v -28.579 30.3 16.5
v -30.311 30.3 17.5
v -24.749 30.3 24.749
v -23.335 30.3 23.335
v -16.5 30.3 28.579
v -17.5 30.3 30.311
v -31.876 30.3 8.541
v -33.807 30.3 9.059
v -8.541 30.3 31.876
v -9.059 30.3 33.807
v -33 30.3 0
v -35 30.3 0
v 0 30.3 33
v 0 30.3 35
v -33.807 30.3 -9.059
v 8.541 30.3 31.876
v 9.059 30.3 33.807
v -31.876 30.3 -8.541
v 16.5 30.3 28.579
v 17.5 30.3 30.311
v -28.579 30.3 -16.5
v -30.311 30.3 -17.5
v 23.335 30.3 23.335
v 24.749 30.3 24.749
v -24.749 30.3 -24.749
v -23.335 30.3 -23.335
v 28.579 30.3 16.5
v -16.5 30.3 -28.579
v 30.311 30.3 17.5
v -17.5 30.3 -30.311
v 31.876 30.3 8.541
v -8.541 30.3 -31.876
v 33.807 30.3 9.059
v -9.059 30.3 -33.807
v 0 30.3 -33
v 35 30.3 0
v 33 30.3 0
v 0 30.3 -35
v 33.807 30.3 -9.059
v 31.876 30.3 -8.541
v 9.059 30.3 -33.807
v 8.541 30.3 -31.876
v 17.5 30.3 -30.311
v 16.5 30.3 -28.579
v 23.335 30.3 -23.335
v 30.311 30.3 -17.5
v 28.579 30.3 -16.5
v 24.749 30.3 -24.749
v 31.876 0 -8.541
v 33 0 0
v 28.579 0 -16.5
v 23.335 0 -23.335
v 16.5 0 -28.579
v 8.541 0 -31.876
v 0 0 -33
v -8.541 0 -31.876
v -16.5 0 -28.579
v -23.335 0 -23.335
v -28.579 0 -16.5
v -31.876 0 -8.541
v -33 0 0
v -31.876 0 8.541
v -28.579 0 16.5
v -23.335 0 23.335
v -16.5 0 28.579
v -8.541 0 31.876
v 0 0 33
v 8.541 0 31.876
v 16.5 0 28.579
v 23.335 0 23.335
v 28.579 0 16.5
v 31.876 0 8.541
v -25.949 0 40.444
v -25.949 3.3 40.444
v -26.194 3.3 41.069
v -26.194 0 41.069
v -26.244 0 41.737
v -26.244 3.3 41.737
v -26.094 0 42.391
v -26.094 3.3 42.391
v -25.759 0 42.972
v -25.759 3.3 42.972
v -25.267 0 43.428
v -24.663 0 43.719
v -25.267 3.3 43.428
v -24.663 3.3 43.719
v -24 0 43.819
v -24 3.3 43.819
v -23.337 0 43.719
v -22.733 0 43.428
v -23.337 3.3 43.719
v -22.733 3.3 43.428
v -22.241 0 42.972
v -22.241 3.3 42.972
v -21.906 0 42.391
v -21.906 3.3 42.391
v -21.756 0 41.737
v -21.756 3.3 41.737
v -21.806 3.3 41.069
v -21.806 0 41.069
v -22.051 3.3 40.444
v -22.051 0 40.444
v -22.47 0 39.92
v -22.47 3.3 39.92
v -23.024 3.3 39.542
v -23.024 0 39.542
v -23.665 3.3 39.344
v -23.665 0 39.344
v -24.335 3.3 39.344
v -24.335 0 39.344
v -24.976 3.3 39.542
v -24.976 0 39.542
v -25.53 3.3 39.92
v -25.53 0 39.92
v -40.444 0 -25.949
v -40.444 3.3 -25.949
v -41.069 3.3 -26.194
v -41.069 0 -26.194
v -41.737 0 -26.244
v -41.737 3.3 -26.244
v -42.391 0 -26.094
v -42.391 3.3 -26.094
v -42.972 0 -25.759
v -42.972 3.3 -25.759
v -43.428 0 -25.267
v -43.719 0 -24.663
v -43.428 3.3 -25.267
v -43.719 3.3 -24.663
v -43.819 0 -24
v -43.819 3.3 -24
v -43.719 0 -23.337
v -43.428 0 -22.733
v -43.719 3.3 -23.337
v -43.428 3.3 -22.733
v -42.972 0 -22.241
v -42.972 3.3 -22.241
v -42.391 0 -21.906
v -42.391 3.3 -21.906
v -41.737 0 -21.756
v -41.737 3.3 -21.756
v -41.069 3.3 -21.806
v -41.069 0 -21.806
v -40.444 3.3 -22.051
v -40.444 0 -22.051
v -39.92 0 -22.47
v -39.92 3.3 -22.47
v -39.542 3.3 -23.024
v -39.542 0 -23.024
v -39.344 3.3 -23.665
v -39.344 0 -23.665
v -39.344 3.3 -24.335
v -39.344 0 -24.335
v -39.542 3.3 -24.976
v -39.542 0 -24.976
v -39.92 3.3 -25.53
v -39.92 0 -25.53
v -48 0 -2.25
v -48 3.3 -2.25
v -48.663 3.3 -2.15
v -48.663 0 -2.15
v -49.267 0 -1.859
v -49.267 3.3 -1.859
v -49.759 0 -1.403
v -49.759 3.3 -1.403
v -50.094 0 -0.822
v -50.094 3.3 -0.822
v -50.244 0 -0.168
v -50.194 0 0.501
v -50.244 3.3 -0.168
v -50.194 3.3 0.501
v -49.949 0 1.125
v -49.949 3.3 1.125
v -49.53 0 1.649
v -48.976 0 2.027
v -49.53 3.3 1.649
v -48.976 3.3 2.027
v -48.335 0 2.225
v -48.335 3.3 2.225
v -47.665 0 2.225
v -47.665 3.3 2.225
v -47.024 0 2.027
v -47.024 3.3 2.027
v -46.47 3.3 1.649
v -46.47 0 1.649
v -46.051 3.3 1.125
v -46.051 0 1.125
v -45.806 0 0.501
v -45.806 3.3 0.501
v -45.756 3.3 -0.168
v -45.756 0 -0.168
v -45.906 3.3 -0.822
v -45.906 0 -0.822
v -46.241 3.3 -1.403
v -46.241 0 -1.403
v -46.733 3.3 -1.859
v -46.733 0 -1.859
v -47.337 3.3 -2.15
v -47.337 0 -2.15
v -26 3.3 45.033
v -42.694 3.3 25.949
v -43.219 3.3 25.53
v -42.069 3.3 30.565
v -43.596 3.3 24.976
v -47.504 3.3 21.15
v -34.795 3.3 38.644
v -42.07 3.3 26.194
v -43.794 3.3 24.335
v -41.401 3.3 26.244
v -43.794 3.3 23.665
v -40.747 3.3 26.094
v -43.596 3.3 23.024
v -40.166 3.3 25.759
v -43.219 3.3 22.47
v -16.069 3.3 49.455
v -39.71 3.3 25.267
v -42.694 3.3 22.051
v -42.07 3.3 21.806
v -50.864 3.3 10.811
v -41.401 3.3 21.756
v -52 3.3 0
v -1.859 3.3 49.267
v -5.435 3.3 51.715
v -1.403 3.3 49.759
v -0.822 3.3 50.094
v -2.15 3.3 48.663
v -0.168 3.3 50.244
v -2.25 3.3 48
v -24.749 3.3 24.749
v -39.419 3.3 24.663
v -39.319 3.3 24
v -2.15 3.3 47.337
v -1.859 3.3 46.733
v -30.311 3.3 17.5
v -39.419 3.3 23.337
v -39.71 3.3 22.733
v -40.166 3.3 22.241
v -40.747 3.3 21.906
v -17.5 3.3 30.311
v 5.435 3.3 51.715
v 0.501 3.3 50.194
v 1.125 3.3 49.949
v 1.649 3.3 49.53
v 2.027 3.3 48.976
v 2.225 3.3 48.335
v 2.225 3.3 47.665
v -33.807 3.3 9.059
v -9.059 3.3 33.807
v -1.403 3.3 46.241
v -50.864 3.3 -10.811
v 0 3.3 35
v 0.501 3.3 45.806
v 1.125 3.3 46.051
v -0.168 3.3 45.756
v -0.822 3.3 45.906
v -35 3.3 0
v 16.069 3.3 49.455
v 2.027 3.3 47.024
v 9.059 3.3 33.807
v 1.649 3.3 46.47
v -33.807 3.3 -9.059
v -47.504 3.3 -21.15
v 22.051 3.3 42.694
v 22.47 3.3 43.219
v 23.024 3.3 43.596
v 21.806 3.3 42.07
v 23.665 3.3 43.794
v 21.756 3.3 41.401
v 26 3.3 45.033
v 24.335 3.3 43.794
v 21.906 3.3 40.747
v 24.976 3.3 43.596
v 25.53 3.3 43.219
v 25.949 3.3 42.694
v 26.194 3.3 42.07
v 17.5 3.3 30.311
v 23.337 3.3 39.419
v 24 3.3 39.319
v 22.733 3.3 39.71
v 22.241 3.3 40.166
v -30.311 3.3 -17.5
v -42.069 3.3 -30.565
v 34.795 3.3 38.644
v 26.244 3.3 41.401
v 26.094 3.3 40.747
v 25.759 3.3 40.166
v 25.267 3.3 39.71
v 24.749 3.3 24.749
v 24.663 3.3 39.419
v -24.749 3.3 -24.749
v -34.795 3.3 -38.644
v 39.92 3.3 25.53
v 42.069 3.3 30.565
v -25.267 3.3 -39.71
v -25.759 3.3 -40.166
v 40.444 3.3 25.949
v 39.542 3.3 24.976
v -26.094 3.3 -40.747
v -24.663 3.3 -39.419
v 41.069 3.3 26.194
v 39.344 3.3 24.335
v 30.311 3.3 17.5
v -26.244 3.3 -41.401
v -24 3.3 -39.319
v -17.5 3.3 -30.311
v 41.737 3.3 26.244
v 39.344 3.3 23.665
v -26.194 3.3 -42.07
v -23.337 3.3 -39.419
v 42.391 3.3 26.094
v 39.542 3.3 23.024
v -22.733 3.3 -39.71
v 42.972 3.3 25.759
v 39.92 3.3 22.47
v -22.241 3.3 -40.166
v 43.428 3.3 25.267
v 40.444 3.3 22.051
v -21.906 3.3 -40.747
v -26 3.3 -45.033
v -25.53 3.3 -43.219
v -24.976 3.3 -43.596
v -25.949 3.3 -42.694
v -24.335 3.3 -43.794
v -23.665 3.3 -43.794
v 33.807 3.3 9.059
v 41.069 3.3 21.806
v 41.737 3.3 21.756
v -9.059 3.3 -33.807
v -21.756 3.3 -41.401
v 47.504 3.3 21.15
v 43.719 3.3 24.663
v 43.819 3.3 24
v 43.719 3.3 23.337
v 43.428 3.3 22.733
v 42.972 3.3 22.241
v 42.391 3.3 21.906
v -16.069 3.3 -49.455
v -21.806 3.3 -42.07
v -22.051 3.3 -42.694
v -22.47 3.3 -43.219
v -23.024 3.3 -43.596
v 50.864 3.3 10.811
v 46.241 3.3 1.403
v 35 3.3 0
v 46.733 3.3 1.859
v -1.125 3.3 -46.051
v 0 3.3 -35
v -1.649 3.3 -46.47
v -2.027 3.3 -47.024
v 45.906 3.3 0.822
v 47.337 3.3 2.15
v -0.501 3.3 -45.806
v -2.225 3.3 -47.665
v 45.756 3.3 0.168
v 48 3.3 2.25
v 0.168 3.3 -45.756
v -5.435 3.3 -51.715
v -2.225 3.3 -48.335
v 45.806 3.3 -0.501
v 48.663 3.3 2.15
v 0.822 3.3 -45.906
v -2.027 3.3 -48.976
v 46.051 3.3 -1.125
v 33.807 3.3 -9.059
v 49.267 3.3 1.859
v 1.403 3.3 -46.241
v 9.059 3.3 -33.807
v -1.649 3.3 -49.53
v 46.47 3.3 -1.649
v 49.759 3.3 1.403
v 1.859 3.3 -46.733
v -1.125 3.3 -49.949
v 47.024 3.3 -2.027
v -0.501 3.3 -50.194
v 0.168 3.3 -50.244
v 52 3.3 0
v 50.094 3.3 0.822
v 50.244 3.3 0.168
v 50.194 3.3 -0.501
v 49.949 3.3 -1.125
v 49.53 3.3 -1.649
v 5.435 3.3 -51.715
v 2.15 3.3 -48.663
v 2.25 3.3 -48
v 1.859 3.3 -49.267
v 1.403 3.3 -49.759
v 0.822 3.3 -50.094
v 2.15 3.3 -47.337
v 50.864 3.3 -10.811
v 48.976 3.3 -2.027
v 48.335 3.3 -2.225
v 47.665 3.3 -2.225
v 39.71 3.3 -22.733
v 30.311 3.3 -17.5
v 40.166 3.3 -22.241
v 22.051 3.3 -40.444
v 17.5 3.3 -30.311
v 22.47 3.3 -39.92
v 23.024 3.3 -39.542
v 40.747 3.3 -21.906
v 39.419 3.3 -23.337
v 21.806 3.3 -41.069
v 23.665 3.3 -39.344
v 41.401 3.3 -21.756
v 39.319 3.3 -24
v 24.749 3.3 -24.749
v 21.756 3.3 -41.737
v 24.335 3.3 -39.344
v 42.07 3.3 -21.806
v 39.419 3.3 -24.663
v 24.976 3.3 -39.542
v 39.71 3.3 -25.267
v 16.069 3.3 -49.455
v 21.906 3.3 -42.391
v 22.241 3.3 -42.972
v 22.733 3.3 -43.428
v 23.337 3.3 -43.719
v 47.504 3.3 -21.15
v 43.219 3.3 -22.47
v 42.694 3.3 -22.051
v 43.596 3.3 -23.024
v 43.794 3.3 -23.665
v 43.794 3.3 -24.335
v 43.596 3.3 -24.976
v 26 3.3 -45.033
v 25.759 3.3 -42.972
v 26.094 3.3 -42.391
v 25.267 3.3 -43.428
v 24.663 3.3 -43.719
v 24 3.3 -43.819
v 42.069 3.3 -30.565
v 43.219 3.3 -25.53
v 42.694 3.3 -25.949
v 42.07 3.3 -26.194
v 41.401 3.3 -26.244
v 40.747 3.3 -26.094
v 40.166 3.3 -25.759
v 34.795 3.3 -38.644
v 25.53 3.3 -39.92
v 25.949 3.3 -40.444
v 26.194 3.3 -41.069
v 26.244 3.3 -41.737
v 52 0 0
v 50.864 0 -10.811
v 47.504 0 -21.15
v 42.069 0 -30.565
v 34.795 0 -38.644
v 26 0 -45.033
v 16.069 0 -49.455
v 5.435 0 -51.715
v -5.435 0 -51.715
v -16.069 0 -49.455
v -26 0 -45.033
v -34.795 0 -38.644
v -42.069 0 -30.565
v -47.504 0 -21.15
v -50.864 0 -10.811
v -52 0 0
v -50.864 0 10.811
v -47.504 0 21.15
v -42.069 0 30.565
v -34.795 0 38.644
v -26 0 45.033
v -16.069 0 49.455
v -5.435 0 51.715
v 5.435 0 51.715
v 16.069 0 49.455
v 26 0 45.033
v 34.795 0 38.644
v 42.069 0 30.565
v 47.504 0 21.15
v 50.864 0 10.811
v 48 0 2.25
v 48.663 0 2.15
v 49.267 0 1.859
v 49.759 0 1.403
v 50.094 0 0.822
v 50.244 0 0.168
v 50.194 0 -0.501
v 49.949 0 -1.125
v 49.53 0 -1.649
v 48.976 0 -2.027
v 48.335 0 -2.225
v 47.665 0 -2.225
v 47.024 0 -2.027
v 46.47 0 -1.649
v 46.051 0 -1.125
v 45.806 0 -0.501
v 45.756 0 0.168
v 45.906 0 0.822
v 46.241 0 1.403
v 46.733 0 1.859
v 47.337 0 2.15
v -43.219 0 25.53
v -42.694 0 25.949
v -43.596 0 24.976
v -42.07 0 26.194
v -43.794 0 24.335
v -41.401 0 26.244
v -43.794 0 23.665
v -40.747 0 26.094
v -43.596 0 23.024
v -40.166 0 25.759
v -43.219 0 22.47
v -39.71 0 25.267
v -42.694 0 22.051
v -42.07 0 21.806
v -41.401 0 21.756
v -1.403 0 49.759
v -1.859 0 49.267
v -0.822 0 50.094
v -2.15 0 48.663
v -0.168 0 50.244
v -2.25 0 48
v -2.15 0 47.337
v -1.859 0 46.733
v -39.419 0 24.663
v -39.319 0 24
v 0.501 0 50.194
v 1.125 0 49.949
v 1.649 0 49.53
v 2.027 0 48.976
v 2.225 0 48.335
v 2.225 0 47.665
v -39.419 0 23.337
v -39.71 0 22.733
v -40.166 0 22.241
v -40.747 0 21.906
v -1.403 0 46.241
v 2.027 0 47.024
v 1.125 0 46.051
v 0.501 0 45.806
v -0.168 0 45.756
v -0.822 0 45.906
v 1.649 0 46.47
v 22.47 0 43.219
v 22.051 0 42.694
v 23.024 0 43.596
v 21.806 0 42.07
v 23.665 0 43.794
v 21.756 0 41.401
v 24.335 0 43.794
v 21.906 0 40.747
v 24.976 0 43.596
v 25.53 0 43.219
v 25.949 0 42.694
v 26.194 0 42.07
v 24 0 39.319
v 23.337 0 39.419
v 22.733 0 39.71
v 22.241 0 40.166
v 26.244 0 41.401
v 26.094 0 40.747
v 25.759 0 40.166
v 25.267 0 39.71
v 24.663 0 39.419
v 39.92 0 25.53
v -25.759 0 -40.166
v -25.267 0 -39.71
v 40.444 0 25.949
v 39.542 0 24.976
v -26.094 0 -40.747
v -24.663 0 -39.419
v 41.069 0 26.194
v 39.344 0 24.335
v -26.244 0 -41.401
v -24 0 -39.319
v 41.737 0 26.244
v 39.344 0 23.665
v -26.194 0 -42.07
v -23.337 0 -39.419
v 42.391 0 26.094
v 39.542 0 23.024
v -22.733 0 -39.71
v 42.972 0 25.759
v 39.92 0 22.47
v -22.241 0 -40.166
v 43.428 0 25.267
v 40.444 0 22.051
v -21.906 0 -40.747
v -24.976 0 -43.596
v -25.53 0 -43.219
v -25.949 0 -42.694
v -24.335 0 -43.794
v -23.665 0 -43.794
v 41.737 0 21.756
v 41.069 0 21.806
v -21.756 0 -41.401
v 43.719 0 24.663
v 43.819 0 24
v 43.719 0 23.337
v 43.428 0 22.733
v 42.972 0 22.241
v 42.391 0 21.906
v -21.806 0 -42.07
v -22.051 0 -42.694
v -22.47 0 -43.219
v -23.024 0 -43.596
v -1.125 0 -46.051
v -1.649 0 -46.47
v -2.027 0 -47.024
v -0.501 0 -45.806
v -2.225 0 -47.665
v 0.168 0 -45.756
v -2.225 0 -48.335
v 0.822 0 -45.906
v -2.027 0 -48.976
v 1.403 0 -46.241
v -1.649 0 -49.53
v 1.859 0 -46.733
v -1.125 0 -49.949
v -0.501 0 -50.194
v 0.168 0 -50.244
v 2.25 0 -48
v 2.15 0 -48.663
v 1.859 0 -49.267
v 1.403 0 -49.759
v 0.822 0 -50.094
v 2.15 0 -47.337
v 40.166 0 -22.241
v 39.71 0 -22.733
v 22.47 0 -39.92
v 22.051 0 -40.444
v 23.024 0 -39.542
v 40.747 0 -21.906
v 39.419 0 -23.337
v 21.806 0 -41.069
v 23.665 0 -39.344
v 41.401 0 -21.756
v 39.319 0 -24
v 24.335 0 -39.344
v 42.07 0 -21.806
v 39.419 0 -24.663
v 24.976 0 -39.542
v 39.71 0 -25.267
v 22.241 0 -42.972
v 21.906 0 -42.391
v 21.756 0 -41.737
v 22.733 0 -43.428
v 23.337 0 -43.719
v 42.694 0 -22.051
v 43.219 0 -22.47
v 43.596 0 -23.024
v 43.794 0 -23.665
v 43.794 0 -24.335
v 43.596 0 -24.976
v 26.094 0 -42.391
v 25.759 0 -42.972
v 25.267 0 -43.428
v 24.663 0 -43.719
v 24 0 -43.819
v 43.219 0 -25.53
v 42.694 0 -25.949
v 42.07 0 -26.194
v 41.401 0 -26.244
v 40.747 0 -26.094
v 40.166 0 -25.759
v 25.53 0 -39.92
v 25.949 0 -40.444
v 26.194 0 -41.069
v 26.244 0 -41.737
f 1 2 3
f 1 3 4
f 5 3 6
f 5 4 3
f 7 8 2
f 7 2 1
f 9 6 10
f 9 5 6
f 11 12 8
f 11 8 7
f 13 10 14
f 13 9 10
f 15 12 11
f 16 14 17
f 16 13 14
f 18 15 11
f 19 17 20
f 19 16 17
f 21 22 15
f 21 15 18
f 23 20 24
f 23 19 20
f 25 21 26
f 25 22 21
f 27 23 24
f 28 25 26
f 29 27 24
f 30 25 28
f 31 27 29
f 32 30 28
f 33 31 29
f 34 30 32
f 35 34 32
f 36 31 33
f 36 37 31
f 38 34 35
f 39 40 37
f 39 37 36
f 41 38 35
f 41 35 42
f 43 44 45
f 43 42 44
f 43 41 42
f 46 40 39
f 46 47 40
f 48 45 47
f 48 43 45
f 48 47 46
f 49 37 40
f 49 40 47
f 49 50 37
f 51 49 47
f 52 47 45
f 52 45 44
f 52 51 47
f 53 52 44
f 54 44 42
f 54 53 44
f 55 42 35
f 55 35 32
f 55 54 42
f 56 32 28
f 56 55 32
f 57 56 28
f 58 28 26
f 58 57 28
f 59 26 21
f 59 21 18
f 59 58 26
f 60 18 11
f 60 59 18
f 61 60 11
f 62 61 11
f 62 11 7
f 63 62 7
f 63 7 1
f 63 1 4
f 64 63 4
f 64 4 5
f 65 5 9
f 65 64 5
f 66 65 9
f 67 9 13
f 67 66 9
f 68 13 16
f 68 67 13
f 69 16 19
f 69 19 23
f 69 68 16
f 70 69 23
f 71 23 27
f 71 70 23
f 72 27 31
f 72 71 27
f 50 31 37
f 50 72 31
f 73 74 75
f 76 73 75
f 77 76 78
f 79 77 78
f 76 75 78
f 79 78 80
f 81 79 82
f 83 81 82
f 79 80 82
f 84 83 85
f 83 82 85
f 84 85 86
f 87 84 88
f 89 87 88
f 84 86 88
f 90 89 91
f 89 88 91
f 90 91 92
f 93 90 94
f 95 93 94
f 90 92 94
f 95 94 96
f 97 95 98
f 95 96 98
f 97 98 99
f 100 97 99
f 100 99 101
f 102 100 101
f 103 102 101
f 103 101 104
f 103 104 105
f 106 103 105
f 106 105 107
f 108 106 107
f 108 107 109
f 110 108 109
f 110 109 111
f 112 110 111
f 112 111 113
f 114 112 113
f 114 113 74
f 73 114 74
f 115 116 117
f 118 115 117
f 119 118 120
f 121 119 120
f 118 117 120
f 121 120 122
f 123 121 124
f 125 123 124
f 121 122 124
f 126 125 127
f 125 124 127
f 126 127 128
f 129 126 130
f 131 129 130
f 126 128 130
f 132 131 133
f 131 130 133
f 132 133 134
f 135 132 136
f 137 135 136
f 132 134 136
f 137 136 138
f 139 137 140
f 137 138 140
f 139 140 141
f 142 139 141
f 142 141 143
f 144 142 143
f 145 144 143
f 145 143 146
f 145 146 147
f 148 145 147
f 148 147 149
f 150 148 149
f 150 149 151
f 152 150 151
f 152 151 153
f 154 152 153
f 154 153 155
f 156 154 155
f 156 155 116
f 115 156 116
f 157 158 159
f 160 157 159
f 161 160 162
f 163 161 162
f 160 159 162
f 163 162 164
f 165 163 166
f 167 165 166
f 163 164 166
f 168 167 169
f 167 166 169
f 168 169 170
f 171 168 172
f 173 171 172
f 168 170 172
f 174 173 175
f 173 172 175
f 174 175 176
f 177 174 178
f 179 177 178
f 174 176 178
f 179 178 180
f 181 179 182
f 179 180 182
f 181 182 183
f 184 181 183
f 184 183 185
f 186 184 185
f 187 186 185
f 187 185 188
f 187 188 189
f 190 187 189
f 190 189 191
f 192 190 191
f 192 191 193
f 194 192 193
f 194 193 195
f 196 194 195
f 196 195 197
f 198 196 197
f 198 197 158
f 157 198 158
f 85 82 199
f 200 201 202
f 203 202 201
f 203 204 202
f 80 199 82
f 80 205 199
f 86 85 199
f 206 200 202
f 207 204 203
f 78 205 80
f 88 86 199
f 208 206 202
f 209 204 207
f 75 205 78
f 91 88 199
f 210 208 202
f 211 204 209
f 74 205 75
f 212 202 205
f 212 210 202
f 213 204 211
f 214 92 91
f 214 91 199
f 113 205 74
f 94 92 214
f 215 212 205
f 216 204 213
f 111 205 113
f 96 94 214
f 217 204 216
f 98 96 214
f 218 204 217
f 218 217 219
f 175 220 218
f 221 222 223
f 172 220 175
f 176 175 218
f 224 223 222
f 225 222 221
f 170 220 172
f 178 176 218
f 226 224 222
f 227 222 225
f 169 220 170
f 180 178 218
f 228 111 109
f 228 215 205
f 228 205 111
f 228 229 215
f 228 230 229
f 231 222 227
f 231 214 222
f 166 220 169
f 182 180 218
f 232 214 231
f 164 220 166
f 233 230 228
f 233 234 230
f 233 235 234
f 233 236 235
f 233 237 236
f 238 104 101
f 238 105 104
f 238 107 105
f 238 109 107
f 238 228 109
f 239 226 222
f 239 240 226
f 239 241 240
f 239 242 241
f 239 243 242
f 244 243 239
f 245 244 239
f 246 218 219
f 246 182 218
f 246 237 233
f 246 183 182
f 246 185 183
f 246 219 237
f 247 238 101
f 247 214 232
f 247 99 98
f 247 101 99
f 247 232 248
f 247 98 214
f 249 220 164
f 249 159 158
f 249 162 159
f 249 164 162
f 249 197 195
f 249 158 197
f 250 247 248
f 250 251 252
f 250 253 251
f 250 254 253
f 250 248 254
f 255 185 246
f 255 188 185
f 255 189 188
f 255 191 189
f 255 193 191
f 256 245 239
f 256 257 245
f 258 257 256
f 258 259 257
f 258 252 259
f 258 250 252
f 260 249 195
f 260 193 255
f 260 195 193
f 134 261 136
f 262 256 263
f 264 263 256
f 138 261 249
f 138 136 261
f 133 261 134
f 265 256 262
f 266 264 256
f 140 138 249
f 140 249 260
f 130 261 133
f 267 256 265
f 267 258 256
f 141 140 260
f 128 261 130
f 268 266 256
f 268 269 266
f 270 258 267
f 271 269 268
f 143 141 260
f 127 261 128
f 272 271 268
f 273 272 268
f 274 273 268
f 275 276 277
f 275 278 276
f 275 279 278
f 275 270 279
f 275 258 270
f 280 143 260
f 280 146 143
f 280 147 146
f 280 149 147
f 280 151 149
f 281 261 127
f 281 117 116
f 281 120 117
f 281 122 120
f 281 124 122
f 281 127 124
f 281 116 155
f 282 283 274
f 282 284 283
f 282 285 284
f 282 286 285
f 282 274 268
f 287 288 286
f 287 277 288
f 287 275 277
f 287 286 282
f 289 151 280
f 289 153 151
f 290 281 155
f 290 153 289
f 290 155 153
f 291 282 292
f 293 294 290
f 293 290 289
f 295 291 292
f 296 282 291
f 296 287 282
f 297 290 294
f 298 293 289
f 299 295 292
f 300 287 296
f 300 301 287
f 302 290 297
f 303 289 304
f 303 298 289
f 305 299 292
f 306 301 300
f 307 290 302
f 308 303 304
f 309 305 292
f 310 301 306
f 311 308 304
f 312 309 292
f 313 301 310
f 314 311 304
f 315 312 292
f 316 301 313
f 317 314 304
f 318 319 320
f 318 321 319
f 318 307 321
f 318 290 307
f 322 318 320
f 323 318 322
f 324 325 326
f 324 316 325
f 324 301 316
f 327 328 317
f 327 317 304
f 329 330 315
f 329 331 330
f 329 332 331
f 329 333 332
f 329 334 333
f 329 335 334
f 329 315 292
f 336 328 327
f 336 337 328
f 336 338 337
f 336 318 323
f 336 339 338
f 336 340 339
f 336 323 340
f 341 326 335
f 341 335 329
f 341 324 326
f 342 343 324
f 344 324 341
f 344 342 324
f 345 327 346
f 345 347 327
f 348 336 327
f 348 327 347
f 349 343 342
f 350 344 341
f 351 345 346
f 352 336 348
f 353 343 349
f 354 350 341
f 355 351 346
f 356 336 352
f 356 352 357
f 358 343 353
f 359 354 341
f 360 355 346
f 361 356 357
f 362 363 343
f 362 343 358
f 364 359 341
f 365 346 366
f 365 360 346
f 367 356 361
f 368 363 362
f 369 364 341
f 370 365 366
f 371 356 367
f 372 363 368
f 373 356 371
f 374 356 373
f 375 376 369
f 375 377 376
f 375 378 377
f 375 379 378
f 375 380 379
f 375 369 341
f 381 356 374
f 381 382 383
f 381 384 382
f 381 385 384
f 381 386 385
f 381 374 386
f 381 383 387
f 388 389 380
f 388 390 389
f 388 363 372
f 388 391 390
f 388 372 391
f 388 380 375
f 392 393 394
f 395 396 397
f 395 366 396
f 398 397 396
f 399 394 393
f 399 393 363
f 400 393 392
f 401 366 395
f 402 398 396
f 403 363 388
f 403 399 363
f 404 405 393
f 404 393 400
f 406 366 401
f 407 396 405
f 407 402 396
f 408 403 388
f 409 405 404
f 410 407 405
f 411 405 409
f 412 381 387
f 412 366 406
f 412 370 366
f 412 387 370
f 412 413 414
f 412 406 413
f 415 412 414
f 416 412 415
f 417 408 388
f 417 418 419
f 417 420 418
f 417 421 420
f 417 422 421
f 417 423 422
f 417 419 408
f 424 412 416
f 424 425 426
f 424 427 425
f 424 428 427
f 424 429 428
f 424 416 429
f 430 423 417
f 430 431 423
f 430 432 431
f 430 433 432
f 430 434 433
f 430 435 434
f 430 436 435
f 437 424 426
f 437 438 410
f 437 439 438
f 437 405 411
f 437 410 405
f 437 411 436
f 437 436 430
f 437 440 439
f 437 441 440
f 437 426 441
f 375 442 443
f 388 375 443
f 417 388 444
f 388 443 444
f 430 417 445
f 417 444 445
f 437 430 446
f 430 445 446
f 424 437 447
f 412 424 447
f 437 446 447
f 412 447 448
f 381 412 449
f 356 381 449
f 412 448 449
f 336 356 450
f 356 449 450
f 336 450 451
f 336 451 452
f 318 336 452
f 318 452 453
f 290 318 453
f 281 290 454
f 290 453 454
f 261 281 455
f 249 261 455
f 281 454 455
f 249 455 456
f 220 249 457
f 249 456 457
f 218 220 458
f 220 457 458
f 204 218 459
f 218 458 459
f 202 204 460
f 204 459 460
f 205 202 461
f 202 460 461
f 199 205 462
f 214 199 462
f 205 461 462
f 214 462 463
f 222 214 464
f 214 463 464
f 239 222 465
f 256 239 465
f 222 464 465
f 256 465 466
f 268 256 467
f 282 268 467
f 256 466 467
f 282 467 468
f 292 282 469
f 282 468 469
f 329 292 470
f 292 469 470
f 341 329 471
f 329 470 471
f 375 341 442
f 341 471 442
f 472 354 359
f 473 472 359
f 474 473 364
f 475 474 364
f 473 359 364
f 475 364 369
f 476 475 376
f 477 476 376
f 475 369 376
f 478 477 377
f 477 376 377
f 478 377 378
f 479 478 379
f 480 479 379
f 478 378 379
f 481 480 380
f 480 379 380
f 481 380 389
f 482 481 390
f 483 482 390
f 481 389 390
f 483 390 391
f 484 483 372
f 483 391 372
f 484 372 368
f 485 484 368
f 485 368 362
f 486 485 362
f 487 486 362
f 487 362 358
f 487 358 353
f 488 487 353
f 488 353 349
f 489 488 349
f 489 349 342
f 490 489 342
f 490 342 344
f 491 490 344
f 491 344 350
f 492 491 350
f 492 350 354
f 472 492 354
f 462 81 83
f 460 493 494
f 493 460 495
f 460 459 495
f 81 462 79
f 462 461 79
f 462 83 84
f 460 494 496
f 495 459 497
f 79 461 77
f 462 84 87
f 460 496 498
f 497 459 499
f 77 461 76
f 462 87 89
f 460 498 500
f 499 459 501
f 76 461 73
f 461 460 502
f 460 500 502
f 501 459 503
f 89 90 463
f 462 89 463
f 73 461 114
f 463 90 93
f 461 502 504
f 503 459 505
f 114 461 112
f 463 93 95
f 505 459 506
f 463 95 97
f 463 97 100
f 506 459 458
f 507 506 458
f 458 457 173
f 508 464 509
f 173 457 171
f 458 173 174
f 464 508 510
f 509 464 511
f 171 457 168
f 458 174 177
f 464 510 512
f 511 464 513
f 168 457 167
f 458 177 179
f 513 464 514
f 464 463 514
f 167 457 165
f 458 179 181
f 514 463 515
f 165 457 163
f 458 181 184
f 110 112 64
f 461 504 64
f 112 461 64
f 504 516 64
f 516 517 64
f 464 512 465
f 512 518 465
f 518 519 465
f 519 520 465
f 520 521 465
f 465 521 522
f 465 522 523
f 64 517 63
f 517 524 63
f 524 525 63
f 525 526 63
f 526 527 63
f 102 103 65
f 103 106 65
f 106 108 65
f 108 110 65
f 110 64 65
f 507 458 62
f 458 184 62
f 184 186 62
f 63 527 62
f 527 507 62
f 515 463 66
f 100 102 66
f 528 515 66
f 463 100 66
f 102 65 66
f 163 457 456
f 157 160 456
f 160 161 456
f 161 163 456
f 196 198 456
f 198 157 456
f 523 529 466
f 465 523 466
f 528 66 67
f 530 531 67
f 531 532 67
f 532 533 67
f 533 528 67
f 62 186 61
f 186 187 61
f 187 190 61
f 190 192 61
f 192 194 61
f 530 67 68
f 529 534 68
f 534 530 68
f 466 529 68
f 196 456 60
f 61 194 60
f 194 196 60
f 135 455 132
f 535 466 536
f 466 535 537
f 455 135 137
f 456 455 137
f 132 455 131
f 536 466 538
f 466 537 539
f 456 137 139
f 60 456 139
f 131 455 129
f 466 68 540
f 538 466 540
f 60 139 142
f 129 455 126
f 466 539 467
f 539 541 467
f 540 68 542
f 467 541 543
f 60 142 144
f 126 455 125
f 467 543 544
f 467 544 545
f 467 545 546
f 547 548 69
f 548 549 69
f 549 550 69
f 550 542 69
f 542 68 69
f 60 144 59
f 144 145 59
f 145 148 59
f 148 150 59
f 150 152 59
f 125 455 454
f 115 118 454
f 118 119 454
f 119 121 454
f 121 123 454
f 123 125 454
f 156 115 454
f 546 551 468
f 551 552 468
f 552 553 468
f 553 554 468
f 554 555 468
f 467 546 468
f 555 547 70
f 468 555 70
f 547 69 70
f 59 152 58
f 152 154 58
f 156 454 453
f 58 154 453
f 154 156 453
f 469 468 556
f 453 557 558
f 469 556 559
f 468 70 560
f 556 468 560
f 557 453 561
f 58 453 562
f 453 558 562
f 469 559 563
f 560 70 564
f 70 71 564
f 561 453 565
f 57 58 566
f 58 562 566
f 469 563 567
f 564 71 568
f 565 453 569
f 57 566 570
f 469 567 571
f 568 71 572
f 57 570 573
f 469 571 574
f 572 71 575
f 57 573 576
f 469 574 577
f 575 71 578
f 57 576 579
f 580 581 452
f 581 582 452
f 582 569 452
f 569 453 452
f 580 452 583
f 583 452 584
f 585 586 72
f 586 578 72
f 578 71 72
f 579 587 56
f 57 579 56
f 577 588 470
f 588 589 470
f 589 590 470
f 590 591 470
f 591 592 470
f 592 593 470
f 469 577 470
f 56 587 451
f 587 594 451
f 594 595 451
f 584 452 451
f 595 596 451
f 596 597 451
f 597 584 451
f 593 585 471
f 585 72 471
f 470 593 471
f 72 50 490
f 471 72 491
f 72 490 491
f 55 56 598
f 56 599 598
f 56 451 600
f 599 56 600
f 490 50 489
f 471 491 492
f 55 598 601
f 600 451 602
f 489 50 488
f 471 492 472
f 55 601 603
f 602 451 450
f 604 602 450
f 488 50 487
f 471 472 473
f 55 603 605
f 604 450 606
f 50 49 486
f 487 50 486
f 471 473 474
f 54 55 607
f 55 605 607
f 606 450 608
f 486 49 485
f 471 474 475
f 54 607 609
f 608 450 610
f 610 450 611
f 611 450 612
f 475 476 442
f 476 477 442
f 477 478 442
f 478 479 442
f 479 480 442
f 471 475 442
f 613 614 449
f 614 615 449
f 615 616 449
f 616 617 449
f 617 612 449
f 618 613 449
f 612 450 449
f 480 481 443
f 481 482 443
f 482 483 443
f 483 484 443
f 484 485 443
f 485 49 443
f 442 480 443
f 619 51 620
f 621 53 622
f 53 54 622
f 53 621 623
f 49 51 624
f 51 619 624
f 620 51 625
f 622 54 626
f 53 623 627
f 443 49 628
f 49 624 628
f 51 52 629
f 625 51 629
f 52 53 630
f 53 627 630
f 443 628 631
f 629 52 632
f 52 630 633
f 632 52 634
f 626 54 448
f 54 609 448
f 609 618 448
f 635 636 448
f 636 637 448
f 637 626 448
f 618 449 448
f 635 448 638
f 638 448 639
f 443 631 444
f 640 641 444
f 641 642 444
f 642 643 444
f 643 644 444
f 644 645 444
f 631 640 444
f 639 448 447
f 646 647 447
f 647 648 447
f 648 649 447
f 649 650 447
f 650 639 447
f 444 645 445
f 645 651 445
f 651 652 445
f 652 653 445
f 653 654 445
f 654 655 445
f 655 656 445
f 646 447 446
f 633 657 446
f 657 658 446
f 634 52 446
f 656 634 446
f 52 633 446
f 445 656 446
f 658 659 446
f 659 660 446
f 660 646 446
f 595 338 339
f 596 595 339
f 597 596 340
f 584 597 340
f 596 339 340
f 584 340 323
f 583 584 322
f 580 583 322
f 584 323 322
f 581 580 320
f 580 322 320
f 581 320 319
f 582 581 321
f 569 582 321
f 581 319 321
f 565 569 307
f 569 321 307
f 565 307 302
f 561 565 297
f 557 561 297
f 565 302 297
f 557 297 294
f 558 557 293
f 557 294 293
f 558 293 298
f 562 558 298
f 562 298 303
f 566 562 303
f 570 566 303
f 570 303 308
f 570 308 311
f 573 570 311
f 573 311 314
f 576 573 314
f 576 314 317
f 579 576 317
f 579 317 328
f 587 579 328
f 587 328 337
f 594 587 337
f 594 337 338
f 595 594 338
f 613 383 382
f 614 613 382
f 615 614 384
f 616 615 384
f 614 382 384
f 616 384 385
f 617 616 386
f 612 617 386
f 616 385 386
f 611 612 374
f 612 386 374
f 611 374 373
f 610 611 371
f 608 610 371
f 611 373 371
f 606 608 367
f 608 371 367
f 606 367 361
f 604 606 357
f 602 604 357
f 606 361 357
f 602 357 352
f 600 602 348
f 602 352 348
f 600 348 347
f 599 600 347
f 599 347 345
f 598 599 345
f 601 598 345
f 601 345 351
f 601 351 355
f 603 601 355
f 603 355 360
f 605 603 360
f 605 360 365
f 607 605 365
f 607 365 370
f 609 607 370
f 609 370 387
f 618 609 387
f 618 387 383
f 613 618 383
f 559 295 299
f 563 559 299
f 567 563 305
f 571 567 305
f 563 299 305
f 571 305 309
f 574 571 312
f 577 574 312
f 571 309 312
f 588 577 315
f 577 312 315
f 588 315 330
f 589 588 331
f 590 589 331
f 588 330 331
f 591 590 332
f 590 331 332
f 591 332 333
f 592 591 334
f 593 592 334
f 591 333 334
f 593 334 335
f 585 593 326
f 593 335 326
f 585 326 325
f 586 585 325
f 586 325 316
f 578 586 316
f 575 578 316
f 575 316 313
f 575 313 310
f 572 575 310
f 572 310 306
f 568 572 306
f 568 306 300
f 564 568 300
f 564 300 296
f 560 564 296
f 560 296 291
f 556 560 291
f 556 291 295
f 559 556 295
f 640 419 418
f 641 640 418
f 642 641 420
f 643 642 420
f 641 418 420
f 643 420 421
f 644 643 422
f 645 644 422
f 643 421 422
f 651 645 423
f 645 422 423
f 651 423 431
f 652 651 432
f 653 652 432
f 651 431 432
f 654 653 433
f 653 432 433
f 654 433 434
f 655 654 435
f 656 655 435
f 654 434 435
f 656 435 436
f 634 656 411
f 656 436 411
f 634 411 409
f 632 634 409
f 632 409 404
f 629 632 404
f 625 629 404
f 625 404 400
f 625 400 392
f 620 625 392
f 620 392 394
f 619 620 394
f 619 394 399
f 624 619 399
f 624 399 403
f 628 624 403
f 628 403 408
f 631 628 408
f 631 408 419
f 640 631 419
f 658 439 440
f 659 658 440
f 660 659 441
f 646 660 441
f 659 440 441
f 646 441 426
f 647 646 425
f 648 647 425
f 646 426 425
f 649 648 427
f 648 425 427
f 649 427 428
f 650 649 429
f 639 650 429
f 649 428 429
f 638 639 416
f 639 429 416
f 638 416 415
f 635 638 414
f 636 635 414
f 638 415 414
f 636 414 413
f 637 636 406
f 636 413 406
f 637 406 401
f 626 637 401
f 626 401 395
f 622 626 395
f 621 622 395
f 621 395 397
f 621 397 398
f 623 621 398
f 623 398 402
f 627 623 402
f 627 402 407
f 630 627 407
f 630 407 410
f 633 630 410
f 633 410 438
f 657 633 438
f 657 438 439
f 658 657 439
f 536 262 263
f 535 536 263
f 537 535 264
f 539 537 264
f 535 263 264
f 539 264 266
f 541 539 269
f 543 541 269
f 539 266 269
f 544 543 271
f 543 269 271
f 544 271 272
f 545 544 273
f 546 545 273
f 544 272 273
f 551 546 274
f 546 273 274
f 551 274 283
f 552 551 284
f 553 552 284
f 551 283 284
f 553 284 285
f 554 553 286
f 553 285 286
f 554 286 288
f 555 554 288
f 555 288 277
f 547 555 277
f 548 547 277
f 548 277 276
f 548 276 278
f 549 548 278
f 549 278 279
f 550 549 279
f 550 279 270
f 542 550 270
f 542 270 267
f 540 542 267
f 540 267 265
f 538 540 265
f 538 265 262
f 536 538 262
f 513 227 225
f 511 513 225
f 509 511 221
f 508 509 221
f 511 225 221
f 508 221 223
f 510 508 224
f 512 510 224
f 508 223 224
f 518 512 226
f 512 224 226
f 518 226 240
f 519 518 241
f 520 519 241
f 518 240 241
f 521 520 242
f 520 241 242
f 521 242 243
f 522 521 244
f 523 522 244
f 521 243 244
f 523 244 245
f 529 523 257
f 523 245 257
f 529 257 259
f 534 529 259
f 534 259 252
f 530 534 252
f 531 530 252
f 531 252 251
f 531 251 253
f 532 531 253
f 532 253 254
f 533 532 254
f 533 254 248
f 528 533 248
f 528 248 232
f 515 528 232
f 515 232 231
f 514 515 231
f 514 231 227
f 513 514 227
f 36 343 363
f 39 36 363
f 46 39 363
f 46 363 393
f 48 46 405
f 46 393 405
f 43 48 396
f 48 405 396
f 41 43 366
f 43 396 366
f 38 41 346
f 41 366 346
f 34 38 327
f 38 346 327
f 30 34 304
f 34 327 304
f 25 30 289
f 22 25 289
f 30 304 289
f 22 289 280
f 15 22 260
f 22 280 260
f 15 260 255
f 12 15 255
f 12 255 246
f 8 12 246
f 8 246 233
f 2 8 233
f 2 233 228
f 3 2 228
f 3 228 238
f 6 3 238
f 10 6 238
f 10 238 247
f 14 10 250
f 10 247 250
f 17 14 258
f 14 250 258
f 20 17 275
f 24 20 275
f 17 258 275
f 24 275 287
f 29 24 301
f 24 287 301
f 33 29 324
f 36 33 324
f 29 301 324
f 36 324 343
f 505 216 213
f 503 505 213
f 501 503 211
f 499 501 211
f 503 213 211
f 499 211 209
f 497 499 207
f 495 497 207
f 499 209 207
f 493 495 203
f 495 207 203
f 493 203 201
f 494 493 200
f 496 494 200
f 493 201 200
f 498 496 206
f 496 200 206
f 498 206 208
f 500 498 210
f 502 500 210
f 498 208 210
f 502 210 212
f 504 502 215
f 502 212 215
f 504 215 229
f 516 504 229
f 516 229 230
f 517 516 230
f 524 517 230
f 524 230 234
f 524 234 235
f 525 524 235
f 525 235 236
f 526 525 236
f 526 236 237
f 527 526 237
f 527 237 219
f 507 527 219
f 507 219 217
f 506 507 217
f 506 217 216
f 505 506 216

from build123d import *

# Parameters (mm, degrees)
SKETCH1_R           = 52
SKETCH1_R_2         = 33
BOSS_EXTRUDE1_DEPTH = 3.3
SKETCH2_R           = 35
SKETCH2_R_2         = 33
BOSS_EXTRUDE2_DEPTH = 27
SKETCH3_R           = 2.25
CUT_EXTRUDE1_DEPTH  = 4.3
CIRPATTERN1_COUNT   = 12


with BuildPart() as part:
    # Sketch1 → Boss-Extrude1 (new body)
    with BuildSketch(Plane(origin=(0, 0, 0), x_dir=(1, 0, 0), z_dir=(0, 1, 0))):
        Circle(SKETCH1_R)
        Circle(SKETCH1_R_2, mode=Mode.SUBTRACT)
    extrude(amount=BOSS_EXTRUDE1_DEPTH)

    # Sketch2 → Boss-Extrude2 (add)
    with BuildSketch(Plane(origin=(0, 3.3, 0), x_dir=(1, 0, 0), z_dir=(0, 1, 0))):
        Circle(SKETCH2_R)
        Circle(SKETCH2_R_2, mode=Mode.SUBTRACT)
    extrude(amount=BOSS_EXTRUDE2_DEPTH)

    # Sketch3 → Cut-Extrude1 (cut, through all)
    with BuildSketch(Plane(origin=(0, 3.3, 0), x_dir=(1, 0, 0), z_dir=(0, 1, 0))):
        with Locations((0, 48)):
            Circle(SKETCH3_R)
    cut_extrude1 = extrude(amount=-CUT_EXTRUDE1_DEPTH, mode=Mode.SUBTRACT)

    # CirPattern1: Cut-Extrude1 ×12 about axis
    cirpattern1_axis = Axis((0, 0, 0), (0, 1, 0))
    for i in range(1, CIRPATTERN1_COUNT):
        add(cut_extrude1.rotate(cirpattern1_axis, i * 360 / CIRPATTERN1_COUNT), mode=Mode.SUBTRACT)


solid = part.part
